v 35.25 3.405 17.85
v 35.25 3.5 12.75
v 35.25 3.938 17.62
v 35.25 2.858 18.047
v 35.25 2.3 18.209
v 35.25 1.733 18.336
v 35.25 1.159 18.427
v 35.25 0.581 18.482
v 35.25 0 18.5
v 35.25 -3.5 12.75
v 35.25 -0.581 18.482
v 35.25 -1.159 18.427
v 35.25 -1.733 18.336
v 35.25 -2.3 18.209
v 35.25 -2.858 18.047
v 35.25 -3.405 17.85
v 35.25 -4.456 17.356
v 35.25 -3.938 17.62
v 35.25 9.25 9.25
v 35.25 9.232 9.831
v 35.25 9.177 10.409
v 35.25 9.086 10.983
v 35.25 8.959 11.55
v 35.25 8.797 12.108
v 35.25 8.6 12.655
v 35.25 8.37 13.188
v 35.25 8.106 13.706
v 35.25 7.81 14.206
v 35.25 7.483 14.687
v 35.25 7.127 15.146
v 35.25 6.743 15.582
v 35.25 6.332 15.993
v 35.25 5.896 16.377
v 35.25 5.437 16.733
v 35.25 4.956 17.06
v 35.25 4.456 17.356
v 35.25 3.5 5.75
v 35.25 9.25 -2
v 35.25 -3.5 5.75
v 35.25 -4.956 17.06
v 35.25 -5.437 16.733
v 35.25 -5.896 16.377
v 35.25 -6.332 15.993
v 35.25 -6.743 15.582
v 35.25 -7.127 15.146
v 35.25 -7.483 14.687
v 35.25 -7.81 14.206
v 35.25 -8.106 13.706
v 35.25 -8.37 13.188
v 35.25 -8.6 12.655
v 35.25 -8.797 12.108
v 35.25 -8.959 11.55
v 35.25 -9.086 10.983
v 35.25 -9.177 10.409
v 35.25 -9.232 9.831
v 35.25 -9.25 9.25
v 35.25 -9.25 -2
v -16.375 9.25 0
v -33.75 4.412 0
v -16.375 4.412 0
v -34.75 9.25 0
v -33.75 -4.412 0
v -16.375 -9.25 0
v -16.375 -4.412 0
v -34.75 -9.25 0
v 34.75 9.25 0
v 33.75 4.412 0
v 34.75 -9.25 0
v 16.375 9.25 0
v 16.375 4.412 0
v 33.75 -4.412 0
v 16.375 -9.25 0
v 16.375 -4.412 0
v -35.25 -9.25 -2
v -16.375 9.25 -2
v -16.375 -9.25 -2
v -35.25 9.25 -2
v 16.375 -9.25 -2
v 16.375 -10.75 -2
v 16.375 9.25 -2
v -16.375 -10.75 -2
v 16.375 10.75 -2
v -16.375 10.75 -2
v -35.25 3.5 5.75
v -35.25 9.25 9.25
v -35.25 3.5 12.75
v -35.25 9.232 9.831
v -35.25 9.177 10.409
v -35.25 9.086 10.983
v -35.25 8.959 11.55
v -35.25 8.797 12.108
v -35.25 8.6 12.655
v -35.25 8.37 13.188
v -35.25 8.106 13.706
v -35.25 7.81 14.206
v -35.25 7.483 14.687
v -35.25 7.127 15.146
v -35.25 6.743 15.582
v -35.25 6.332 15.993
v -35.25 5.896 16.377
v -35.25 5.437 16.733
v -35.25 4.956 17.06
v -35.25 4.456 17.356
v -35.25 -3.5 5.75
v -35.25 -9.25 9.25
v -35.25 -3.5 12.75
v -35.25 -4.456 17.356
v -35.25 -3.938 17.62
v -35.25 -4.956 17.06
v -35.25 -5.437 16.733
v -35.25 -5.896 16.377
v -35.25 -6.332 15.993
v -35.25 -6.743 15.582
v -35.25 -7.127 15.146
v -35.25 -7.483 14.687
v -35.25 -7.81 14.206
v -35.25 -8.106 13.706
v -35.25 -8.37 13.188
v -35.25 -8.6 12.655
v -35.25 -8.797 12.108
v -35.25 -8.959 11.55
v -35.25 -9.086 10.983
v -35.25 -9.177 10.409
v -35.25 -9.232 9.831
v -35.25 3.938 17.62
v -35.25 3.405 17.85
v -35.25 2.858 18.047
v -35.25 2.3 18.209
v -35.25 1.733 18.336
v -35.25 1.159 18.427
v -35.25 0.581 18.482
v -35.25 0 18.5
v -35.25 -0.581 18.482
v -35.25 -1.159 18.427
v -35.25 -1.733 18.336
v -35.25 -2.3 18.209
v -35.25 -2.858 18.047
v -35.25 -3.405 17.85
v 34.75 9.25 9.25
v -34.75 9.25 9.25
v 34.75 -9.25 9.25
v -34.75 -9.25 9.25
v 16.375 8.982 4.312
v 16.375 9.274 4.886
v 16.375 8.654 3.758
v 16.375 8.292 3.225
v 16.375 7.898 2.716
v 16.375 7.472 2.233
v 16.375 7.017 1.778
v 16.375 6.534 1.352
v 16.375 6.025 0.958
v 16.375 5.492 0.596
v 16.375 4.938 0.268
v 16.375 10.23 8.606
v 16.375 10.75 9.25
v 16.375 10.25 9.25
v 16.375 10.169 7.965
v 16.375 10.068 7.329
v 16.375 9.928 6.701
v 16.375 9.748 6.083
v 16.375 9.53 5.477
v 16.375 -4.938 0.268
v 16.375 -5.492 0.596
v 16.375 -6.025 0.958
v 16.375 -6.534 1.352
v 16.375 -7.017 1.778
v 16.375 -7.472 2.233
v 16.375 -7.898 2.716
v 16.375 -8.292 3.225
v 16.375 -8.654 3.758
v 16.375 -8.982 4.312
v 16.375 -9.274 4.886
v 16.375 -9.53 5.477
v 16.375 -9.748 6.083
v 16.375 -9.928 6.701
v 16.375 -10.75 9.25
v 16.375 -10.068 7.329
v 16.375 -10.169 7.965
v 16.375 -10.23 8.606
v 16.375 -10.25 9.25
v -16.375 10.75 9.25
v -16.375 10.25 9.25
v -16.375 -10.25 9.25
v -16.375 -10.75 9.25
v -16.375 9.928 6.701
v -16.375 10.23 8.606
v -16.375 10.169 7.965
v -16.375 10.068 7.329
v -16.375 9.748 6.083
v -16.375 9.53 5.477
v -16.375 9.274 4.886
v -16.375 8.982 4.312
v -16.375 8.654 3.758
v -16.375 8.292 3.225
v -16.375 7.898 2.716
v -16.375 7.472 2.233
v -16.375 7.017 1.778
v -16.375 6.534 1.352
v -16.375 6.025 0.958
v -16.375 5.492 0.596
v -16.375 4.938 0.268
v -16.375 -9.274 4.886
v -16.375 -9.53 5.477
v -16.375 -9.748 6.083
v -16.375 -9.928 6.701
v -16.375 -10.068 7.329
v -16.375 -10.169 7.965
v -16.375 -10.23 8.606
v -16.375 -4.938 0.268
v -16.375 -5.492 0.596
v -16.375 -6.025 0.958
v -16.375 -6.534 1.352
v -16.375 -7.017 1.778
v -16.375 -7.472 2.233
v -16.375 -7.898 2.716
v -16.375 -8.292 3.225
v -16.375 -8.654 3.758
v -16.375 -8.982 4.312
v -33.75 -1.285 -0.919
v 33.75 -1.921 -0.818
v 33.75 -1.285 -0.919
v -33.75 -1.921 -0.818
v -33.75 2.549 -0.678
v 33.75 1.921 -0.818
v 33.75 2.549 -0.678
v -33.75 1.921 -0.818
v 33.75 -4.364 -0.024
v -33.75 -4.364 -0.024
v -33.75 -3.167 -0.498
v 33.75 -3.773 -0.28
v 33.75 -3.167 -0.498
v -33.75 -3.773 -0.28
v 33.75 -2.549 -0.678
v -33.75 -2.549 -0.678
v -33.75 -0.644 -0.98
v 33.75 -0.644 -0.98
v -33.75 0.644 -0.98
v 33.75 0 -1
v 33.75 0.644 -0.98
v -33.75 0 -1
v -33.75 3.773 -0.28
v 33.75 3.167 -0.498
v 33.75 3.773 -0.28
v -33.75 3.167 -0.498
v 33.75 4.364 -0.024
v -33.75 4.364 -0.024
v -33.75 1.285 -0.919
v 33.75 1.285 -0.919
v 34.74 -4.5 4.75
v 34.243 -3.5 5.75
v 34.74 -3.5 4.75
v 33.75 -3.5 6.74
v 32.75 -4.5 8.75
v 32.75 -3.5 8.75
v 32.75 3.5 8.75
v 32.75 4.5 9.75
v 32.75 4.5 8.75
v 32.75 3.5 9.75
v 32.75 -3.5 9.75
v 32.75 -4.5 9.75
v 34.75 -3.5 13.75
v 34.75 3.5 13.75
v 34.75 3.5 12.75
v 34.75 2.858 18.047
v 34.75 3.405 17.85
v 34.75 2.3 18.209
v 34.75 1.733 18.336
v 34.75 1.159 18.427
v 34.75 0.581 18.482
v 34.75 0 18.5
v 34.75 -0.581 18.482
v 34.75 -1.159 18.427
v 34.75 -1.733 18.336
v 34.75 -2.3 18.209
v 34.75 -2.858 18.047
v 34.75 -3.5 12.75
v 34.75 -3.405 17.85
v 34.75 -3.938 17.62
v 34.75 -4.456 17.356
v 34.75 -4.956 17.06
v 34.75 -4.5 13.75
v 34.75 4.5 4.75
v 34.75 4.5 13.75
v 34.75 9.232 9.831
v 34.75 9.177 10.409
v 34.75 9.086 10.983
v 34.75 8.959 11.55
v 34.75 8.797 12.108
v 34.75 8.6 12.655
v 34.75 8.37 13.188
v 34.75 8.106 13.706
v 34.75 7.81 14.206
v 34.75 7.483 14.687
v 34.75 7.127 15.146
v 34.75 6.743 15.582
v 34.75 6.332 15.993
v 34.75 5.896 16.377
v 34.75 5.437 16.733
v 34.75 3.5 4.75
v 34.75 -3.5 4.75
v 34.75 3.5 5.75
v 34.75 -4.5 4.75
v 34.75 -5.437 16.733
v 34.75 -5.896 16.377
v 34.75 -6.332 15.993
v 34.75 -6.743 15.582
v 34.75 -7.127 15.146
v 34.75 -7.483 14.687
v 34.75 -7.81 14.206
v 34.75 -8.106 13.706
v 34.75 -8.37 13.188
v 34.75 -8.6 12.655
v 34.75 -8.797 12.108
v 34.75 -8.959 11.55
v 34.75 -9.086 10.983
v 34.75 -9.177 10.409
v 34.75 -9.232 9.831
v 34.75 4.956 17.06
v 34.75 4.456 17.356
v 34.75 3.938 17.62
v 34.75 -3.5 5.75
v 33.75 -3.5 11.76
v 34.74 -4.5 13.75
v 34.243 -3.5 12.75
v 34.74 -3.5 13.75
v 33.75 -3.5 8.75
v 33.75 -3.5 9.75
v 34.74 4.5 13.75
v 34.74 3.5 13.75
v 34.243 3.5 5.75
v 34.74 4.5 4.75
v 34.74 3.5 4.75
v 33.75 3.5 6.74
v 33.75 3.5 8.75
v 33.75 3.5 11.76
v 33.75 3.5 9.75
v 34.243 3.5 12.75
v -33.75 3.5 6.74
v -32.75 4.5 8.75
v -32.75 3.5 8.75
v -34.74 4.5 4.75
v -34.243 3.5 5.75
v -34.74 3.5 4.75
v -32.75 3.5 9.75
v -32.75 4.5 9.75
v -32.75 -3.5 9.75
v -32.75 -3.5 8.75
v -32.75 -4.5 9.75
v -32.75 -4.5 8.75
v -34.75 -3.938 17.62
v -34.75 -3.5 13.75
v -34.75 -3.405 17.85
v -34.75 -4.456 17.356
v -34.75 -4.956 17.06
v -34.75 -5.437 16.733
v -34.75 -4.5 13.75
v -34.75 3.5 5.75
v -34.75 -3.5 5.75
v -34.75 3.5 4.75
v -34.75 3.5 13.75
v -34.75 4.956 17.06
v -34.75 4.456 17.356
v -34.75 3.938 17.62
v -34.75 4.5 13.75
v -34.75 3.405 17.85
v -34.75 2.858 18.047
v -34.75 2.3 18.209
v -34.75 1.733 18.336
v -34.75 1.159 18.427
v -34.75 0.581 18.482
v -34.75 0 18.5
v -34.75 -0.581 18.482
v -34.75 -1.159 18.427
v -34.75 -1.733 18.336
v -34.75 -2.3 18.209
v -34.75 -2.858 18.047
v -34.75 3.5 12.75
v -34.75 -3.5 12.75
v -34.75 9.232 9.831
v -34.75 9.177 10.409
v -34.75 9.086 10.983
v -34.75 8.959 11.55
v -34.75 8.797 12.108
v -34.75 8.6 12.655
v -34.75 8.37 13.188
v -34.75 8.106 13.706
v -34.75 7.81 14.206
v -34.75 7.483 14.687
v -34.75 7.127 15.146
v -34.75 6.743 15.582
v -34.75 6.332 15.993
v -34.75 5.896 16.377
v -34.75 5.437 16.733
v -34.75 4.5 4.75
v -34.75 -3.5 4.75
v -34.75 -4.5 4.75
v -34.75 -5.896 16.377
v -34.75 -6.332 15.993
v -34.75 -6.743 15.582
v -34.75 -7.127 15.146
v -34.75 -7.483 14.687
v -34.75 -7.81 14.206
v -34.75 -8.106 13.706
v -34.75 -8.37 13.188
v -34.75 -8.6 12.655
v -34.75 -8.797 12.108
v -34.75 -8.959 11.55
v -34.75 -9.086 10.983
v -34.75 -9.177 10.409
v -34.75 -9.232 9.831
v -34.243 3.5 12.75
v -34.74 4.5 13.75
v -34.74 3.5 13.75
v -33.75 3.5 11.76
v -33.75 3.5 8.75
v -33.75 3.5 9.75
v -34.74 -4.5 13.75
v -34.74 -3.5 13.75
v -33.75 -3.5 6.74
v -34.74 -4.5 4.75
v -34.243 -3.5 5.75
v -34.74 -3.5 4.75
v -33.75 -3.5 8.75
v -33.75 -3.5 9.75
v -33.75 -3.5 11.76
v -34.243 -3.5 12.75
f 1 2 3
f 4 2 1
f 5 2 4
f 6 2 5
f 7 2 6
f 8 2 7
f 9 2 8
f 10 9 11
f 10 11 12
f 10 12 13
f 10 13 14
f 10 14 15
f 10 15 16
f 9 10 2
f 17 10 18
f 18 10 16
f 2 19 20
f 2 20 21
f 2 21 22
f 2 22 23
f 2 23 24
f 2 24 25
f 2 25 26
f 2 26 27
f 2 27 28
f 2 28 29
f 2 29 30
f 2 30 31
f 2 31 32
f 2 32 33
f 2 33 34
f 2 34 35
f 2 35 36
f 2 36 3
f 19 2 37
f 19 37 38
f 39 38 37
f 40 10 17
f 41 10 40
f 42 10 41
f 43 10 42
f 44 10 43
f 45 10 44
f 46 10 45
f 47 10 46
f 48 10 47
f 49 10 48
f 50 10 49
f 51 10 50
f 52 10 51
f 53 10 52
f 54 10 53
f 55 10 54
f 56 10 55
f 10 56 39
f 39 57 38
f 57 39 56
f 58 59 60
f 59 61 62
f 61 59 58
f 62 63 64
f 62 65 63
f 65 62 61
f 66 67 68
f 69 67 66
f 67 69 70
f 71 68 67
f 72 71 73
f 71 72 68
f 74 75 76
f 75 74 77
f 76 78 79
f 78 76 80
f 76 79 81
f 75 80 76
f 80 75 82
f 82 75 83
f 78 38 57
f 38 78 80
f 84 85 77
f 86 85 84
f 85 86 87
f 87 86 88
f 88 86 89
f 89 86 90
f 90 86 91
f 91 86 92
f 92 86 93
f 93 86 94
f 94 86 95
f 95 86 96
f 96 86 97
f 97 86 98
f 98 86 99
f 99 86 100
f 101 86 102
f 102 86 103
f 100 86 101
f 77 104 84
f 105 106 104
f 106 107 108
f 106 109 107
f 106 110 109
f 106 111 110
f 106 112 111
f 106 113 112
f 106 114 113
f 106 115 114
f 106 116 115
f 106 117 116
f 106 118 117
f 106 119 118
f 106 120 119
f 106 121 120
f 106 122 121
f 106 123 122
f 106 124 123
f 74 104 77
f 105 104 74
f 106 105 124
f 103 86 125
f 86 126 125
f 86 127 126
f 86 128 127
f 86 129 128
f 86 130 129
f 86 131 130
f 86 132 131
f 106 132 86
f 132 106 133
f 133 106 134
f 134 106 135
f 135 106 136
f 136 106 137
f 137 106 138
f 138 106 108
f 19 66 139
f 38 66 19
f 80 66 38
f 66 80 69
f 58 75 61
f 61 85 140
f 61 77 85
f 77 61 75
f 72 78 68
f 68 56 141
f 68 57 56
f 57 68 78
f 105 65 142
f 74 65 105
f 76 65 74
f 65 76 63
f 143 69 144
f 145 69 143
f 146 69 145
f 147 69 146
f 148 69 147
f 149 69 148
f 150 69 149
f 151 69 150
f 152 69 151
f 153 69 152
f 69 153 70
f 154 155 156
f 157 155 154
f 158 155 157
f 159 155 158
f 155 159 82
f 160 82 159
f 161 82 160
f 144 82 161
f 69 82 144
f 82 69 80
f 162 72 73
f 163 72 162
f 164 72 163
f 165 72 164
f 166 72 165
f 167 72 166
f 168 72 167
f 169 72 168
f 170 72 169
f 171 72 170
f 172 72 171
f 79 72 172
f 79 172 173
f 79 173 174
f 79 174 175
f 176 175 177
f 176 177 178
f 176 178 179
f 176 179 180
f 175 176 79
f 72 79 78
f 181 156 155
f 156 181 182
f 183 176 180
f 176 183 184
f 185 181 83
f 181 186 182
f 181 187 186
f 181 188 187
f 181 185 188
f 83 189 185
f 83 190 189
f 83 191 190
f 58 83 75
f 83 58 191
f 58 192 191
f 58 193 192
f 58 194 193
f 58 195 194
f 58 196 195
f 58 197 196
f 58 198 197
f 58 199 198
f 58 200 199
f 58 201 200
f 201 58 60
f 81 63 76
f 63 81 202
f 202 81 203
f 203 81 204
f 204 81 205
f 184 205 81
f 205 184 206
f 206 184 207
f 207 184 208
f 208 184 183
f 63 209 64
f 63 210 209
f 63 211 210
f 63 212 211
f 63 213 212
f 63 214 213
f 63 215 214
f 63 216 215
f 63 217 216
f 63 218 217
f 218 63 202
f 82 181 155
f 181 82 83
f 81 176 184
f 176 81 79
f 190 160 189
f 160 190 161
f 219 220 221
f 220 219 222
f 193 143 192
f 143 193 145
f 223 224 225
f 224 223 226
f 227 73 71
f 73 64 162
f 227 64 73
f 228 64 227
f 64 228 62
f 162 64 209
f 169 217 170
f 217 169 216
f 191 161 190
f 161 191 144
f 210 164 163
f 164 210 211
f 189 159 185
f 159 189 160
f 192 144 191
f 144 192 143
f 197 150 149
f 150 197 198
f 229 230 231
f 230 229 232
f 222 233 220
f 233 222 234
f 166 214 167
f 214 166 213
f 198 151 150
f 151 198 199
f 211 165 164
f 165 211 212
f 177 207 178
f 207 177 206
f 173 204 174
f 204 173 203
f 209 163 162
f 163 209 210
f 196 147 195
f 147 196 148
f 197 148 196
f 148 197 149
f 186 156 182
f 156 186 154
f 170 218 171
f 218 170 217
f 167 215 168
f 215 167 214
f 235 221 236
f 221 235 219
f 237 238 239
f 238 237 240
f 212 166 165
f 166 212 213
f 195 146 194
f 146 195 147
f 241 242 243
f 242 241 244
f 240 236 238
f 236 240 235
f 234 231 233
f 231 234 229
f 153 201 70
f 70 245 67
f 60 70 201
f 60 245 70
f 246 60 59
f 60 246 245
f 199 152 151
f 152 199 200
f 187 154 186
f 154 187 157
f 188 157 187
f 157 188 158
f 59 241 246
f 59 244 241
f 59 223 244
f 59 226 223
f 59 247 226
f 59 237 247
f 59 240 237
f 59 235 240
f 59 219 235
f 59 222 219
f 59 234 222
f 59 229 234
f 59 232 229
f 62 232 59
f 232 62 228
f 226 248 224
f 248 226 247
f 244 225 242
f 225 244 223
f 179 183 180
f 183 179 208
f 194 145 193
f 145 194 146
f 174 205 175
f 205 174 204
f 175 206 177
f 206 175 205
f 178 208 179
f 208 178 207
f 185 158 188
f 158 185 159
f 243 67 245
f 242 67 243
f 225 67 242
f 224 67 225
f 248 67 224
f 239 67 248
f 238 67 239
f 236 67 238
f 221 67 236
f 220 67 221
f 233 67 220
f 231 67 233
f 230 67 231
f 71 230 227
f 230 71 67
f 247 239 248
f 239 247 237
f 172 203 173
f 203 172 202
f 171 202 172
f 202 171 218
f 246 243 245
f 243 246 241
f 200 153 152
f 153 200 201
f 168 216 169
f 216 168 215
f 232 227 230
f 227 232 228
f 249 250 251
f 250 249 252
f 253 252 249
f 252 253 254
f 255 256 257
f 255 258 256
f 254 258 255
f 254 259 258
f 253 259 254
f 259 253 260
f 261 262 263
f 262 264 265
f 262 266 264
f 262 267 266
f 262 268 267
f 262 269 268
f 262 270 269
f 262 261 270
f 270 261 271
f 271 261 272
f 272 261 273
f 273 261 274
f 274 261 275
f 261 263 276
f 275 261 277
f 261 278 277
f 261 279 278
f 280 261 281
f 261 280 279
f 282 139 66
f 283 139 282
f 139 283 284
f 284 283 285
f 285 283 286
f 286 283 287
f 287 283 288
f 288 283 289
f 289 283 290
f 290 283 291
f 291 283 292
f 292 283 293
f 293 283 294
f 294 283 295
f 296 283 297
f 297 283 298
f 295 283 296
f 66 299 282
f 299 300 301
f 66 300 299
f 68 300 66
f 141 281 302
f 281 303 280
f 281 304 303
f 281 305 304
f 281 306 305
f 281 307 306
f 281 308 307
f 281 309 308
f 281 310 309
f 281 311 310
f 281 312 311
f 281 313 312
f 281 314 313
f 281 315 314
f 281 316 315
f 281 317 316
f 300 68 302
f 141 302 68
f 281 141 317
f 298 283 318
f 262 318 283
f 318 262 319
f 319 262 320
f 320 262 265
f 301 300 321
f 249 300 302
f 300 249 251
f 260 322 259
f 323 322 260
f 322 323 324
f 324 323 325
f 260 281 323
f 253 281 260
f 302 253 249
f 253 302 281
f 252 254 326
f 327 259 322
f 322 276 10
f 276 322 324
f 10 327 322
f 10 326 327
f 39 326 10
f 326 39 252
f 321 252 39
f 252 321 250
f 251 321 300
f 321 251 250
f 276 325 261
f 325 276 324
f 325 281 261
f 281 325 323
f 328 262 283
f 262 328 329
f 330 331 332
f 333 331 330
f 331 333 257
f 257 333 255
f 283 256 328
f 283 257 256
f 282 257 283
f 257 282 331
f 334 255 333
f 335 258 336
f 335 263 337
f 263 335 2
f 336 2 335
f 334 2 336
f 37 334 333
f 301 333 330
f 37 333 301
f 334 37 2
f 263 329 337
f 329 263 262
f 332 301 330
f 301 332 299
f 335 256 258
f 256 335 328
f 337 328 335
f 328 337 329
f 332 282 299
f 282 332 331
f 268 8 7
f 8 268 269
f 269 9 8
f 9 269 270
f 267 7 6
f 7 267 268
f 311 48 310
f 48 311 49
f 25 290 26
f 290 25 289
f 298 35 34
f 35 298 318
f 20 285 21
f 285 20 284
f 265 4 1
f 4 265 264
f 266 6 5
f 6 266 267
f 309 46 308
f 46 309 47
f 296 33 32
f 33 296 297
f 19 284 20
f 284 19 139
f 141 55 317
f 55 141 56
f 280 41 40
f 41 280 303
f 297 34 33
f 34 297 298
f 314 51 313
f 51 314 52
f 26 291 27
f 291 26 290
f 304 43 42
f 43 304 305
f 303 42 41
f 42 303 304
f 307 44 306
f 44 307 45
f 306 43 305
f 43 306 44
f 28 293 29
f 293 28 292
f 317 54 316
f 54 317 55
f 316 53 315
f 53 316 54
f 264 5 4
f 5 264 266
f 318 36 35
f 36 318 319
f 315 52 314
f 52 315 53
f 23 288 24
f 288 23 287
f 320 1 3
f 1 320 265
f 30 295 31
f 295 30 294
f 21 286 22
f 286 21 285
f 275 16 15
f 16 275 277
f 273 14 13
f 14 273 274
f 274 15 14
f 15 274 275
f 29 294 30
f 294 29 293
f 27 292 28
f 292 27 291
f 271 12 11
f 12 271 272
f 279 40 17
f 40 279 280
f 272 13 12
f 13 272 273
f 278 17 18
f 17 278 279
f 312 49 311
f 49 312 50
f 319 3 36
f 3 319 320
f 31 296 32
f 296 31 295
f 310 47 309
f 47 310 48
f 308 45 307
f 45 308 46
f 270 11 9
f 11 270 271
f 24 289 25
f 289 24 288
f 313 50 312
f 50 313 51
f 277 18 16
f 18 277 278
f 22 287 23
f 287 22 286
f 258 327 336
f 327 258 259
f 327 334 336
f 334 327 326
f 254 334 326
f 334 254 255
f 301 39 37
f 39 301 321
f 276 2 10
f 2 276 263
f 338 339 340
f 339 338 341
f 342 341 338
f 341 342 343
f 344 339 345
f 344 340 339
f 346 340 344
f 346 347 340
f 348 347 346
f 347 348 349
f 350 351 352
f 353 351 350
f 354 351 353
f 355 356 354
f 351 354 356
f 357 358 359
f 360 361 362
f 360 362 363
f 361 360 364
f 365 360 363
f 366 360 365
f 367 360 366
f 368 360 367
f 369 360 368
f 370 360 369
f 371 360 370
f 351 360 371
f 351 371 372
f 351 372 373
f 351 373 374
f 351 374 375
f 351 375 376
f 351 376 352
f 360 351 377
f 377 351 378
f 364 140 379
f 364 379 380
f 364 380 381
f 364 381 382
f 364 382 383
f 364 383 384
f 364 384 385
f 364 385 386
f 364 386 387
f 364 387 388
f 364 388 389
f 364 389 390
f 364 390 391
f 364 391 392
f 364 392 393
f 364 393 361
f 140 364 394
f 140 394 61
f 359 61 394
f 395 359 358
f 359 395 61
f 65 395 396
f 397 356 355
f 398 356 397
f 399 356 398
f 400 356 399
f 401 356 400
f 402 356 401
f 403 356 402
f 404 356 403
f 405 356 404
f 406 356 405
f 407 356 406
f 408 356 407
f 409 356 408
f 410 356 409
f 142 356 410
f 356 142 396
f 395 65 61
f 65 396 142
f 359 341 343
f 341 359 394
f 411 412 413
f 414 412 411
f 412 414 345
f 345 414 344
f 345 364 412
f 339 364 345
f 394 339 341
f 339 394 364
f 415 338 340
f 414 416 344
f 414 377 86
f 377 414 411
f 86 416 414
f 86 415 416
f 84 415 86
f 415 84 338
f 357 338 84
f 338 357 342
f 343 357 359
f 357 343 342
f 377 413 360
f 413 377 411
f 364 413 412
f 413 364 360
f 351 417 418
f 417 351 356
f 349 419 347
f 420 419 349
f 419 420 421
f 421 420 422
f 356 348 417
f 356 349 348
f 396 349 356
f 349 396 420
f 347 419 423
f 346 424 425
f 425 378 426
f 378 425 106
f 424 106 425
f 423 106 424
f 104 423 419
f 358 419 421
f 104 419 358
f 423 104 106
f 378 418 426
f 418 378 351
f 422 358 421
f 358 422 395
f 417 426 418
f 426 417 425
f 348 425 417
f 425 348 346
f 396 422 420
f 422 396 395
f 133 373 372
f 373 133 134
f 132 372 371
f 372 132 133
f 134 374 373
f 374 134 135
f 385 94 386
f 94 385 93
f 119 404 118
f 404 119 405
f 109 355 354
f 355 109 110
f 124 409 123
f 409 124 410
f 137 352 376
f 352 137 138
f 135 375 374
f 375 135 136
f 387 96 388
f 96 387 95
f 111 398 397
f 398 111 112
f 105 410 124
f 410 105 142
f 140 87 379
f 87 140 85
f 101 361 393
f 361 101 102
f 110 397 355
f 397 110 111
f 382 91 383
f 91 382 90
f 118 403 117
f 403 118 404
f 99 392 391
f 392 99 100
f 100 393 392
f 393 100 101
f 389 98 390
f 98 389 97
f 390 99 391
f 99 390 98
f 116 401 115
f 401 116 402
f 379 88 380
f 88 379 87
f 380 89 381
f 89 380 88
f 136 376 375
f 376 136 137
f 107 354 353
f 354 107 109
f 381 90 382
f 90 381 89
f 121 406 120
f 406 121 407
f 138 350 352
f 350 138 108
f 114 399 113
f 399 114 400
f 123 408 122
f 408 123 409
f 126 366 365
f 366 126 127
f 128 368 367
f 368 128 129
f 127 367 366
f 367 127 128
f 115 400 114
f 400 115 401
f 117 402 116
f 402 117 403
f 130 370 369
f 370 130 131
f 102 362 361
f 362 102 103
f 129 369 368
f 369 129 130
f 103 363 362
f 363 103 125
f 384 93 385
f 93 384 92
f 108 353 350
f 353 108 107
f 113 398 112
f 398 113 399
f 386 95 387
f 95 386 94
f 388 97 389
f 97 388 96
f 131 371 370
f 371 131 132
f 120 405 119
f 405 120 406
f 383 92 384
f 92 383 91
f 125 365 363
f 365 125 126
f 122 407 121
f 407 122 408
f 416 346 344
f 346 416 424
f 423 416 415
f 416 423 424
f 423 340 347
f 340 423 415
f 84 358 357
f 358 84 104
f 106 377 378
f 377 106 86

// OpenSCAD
BAT_LENGTH = 65.5;
BAT_R = 18.5/2;

BOTTOM_THICKNESS = 2;
SIDE_THICKNESS = 0.5;

PROTRUSION_HEIGHT = 2;
PROTRUSION_WIDTH = 7;
PROTRUSION_THICKNESS = 1;

HOLE_WIDTH = 1;

MID_LENGTH = BAT_LENGTH/2;
MID_EPS = 1;

$fn = 100;

module plate (h, l, w) {
    translate ([-h/2, -l/2, 0]) {
        cube ([h, l, w]);
    }
}

module side () {
    difference () {
        union () {
            translate ([0, -BAT_R, 0]) cube ([SIDE_THICKNESS, BAT_R*2, BAT_R]);
            translate ([0, 0, BAT_R]) rotate ([0, -90, 0]) {
                translate ([0, 0, -SIDE_THICKNESS]) cylinder (SIDE_THICKNESS, r=BAT_R);
                translate ([0, 0, PROTRUSION_HEIGHT/2]) {
                    plate (PROTRUSION_THICKNESS, PROTRUSION_WIDTH, PROTRUSION_HEIGHT/2);
                }
                for (t=[0,180]) rotate ([0, 0, t]) {
                    translate ([0, -PROTRUSION_WIDTH/2-PROTRUSION_THICKNESS/2, 0]) hull () {
                        plate (PROTRUSION_THICKNESS, PROTRUSION_THICKNESS, PROTRUSION_HEIGHT);
                        plate ((PROTRUSION_HEIGHT+PROTRUSION_THICKNESS)*3, PROTRUSION_THICKNESS, 0.01);
                    }
                }
            }
        }
        union () {
            translate ([0, 0, BAT_R]) {
                rotate ([0, -90, 0]) translate ([0, 0, -SIDE_THICKNESS*2]) {
                    plate (PROTRUSION_WIDTH, PROTRUSION_WIDTH, SIDE_THICKNESS*2+PROTRUSION_THICKNESS);
                }
            }
        }
    }
}

module mid () {
}

difference () {
    union () {
        translate ([0, 0, -BOTTOM_THICKNESS]) {
            plate (BAT_LENGTH+PROTRUSION_HEIGHT*2+SIDE_THICKNESS*2, BAT_R*2, BOTTOM_THICKNESS);
        }
        translate ([0, 0, -BOTTOM_THICKNESS]) {
            plate (MID_LENGTH, BAT_R*2+MID_EPS*3, BAT_R+BOTTOM_THICKNESS);
        }
    }
    translate ([0, 0, BAT_R]) rotate ([0, -90, 0]) translate ([0, 0, -BAT_LENGTH/2-MID_EPS]) {
        cylinder (BAT_LENGTH+MID_EPS*2, r=BAT_R+MID_EPS);
    }
}
for (t=[0,180]) rotate ([0, 0, t]) {
    translate ([BAT_LENGTH/2+PROTRUSION_HEIGHT, 0, 0]) side ();
}
mid ();
